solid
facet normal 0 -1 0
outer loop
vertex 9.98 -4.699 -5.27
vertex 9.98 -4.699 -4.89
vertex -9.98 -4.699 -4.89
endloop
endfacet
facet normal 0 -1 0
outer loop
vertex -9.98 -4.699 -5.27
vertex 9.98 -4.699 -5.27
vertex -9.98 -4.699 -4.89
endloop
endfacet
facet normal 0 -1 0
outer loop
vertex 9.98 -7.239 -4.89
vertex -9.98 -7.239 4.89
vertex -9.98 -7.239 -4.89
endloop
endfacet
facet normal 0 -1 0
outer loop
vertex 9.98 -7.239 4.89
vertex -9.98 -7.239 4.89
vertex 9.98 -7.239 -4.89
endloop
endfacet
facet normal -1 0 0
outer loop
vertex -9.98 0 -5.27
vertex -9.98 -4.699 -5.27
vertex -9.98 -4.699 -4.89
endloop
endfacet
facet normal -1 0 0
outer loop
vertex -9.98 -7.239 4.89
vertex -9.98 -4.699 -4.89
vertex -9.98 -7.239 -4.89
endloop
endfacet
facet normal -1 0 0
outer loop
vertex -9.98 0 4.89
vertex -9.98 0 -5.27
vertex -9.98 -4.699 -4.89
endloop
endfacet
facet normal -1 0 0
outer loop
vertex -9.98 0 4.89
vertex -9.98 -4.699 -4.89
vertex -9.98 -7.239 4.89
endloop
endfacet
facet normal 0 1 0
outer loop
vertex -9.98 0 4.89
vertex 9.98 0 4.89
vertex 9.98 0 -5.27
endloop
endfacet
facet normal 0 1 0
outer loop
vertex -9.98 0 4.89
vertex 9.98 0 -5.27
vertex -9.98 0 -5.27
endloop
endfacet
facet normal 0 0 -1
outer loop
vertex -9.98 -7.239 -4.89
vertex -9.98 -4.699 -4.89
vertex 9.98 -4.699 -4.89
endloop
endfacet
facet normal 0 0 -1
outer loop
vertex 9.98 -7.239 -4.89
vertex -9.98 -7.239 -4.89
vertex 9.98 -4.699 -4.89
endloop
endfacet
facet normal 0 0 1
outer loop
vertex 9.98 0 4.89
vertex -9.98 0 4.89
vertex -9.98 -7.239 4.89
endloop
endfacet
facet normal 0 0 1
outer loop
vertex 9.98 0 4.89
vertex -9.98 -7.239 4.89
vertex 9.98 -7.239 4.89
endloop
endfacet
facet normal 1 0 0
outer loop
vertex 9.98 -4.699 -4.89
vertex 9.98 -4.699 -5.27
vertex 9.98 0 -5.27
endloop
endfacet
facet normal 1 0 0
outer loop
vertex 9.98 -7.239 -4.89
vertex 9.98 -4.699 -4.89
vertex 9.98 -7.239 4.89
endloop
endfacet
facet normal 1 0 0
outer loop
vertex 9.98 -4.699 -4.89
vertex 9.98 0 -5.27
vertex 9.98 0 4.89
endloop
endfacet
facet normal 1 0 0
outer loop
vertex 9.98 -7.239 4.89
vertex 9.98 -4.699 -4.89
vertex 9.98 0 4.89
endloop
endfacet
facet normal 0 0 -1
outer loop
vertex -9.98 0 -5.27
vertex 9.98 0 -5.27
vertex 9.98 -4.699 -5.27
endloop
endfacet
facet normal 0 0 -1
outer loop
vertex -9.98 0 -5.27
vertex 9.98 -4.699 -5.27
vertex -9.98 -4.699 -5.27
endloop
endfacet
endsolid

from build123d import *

# Parameters (mm, degrees)
F0_W     = 19.96
F0_H     = 9.779
F1_DEPTH = 7.239
F2_W     = 19.96
F2_H     = 0.381
F3_DEPTH = 4.699


with BuildPart() as f1:
    # F0 (on Front) → F1 (new body)
    with BuildSketch(Plane.XZ):
        Rectangle(F0_W, F0_H)
    extrude(amount=F1_DEPTH)

    # F2 (on face) → F3 (join)
    with BuildSketch(Plane(origin=(0, 0, 0), x_dir=(-1, 0, 0), z_dir=(0, 1, 0))):
        with Locations((0, -5.08)):
            Rectangle(F2_W, F2_H)
    extrude(amount=-F3_DEPTH)


solid = f1.part
